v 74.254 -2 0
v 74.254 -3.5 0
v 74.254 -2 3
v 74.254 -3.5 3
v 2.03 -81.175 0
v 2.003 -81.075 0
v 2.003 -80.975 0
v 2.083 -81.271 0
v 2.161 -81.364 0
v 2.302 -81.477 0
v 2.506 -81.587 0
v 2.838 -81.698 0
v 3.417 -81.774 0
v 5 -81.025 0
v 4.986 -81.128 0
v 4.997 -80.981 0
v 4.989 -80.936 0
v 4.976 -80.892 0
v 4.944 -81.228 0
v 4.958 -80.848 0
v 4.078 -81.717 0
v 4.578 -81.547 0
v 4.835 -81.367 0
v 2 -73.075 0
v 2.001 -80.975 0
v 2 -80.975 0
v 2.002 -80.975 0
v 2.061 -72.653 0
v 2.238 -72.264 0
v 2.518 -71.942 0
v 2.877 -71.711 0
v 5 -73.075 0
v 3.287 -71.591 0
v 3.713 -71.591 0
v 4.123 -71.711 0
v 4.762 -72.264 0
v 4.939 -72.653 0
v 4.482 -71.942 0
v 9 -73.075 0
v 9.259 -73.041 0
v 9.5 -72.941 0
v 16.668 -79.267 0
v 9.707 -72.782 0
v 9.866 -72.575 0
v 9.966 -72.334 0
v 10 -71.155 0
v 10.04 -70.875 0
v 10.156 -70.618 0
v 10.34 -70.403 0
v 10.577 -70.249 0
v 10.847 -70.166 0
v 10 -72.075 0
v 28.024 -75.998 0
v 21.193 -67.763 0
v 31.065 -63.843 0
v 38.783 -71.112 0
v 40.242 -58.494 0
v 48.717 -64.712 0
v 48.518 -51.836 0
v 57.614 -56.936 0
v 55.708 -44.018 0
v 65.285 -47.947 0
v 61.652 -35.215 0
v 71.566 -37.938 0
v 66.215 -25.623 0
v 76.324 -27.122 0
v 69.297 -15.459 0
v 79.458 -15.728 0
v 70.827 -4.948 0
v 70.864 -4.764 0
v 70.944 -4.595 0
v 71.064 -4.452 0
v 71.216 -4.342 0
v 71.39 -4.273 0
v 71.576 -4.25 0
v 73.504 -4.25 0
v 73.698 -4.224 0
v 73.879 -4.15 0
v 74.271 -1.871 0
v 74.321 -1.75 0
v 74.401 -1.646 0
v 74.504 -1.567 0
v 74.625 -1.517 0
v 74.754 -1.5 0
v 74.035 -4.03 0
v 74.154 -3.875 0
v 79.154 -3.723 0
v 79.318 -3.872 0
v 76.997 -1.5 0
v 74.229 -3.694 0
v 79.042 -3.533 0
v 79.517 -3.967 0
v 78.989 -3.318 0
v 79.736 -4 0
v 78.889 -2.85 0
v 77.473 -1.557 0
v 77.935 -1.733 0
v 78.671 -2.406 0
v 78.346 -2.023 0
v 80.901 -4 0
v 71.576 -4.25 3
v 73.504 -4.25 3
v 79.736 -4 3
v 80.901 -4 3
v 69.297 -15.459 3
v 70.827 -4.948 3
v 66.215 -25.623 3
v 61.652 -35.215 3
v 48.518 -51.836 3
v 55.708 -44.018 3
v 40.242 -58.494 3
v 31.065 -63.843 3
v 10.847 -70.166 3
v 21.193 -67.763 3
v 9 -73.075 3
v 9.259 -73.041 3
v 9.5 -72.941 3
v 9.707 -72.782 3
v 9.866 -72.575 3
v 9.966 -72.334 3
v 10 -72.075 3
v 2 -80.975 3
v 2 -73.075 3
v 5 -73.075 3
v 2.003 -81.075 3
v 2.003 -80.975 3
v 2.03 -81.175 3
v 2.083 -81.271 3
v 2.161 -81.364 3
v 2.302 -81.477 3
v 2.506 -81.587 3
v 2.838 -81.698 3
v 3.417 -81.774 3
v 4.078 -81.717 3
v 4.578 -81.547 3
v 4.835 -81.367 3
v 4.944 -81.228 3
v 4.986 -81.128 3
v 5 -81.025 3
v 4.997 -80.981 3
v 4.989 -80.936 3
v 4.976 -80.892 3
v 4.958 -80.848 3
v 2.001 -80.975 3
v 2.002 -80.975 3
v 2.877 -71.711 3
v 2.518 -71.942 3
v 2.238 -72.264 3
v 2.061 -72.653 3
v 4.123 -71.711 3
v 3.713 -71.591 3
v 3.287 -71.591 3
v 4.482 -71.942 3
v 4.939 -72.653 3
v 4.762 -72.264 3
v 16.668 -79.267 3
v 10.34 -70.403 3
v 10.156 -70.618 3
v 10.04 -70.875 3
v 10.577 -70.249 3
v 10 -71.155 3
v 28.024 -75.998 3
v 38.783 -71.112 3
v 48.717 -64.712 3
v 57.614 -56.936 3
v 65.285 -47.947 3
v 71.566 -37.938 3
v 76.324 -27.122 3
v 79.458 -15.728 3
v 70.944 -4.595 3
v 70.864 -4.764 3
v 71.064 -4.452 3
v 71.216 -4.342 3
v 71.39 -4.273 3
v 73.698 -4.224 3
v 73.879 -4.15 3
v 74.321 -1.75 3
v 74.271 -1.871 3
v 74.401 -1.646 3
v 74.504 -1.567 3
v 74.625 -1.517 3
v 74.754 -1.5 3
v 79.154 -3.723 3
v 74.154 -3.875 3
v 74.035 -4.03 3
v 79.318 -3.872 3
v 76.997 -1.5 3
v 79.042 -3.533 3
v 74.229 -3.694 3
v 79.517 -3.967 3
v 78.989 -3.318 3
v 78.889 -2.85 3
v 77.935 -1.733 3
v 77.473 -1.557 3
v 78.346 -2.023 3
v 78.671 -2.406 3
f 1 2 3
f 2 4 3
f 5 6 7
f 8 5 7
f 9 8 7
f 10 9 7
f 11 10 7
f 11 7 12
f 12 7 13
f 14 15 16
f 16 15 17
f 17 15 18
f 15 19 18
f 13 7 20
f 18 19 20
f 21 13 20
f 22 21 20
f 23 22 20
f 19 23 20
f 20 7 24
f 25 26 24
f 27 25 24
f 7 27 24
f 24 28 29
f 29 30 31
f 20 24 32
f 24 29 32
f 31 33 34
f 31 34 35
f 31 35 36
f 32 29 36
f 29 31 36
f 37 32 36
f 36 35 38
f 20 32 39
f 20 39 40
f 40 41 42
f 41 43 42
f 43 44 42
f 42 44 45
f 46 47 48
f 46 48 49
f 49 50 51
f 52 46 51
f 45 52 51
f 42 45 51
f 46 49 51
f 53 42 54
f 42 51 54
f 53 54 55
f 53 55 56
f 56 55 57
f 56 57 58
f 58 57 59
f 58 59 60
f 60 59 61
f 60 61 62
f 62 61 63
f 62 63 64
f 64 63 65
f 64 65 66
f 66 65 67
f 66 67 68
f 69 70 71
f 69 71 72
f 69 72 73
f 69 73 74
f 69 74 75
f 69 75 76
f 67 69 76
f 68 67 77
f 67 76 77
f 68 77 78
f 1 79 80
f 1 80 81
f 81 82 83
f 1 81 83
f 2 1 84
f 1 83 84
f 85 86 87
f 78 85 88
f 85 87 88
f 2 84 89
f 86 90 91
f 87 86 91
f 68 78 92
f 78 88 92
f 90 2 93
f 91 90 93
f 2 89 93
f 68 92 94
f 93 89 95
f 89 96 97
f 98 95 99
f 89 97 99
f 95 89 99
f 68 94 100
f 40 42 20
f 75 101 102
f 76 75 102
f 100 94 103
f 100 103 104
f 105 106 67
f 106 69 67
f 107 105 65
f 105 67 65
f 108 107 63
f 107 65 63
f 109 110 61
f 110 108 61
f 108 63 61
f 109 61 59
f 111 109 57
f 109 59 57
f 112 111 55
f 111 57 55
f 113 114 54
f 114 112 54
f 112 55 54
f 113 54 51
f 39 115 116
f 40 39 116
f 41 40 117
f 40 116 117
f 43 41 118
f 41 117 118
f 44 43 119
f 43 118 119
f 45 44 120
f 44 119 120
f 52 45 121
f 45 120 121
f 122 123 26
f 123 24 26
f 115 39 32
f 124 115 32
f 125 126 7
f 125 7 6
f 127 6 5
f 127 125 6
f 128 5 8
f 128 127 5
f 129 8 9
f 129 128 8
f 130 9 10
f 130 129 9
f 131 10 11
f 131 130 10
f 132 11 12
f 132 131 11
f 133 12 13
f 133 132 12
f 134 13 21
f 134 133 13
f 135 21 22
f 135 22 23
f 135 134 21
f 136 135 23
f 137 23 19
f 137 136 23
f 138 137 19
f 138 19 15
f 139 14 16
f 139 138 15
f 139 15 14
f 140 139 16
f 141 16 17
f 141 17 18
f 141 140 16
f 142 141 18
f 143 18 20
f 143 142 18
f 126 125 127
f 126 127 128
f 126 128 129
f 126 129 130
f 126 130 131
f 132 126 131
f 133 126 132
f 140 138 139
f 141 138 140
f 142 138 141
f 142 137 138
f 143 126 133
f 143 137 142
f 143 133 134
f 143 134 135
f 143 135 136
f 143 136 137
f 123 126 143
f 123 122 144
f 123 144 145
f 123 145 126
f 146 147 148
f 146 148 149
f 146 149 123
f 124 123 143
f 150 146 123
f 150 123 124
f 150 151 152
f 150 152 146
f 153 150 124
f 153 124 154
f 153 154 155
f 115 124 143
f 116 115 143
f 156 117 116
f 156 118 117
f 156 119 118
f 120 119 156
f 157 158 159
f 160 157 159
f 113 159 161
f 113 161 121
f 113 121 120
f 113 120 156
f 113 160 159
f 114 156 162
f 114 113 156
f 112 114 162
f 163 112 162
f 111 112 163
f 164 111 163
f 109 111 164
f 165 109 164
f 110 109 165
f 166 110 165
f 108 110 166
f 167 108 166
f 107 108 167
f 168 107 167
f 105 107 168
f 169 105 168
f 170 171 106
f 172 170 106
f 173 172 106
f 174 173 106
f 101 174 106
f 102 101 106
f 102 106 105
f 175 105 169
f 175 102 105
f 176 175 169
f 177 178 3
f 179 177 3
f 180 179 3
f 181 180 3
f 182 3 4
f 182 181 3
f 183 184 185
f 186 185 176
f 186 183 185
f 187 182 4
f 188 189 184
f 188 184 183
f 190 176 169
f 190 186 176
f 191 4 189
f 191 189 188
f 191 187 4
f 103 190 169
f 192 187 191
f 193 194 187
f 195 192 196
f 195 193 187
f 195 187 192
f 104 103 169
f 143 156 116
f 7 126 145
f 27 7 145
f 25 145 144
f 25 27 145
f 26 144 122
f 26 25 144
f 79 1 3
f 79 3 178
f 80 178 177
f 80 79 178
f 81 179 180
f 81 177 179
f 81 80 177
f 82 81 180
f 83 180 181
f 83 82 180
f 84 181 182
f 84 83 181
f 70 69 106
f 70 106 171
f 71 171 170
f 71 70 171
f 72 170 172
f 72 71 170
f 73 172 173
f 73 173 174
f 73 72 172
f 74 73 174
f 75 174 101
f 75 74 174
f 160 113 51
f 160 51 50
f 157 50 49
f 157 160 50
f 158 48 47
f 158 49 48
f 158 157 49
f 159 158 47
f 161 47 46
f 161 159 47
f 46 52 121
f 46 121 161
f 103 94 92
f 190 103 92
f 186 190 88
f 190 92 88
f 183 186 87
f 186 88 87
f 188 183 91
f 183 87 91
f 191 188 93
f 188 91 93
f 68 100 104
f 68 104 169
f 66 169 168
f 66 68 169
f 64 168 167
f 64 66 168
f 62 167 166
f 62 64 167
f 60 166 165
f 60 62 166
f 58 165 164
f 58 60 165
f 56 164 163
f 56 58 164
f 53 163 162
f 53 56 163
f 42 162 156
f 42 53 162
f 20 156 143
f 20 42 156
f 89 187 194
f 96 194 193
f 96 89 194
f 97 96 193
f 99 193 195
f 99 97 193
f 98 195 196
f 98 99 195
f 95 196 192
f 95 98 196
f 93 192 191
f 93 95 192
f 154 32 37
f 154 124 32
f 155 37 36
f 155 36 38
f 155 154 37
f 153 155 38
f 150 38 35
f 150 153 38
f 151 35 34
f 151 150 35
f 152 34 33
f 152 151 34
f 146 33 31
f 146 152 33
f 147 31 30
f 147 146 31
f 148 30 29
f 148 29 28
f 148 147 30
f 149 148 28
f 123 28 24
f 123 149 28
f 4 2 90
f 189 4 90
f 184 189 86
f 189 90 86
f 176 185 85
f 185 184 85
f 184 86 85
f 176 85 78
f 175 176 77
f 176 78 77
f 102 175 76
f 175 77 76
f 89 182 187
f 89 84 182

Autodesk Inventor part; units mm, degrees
ref_plane "YZ Plane" through (0, 0, 0) normal (1, 0, 0) x (0, 1, 0)
ref_plane "XZ Plane" through (0, 0, 0) normal (0, 1, 0) x (-1, 0, 0)
ref_plane "XY Plane" through (0, 0, 0) normal (0, 0, 1) x (1, 0, 0)
sketch "Sketch1" plane through (0, 0, 0) normal (0, 0, 1) x (1, 0, 0)
  arc A0 (2, -80.9753) -> (80.9861, -1.5) centre (0, 0) ccw
  arc A1 (10, -70.2922) -> (70.9842, -1.5) centre (0, 0) ccw
  line L0 (10, -73.0753) -> (10, -70.2922)
  line L1 (70.9842, -1.5) -> (80.9861, -1.5)
  line L2 (0, 0) -> (0, 0) construction
  line L3 (10, -73.0753) -> (2, -73.0753)
  line L4 (2, -73.0753) -> (2, -80.9753)
  point P0 (75.9851, -1.5)
  dimension "d0" = 162
  dimension "d1" = 142
  dimension "d12" = 8
  dimension "d13" = 2
  dimension "d14" = 7.9
  dimension "d23" = 1.5
extrude "Extrusion1" add sketch "Sketch1" along normal blind 3
sketch "Sketch3" plane through (0, 0, 3) normal (0, 0, 1) x (1, 0, 0)
  line L0 (10, -73.0753) -> (2, -73.0753) projected
  circle A0 centre (3.5, -73.0753) radius 1.5
  line L1 (2, -73.0753) -> (2, -80.9753) construction
  line L2 (2, -77.0253) -> (11.8753, -77.0253) construction
  ellipse E0 centre (3.5, -81.0253) end of major axis (5, -81.0253) minor radius 0.75
  point P0 (0, 0)
  point P1 (5, -73.0753)
  dimension "d15" = 3
  dimension "d16" = 1.5
  dimension "d20" = 0.75
  dimension "d21" = 1.5
  dimension "d22" = 4
extrude "Extrusion3" add sketch "Sketch3" against normal up to surface (3 mm away) contours L0 A0 | E0 picked at (3.784, -72.1991)
fillet "Fillet1" radius 1 2 edges at (10, -73.0753, 1.5) (10, -70.2922, 1.5)
sketch "Sketch4" plane through (0, 0, 3) normal (0, 0, 1) x (1, 0, 0)
  line L0 (80.9861, -1.5) -> (70.9842, -1.5) projected
  line L1 (80.9861, -1.5) -> (78.9861, -1.5)
  line L2 (78.9861, -4) -> (80.9012, -4)
  arc A0 (4.9576, -80.8481) -> (80.9861, -1.5) centre (0, 0) ccw projected
  arc A1 (80.9012, -4) -> (80.9861, -1.5) centre (0, 0) ccw
  line L3 (78.9861, -1.5) -> (78.9861, -4)
  line L4 (74.2542, -1.5) -> (70.9842, -1.5)
  arc A2 (10.8472, -70.1665) -> (70.9842, -1.5) centre (0, 0) ccw projected
  arc A3 (70.8727, -4.25) -> (70.9842, -1.5) centre (0, 0) ccw
  line L5 (70.8727, -4.25) -> (74.2542, -4.25)
  line L6 (74.2542, -4.25) -> (74.2542, -1.5)
  point P0 (10, -70.2922)
  dimension "d25" = 2.5
  dimension "d30" = 2
  dimension "d31" = 2.75
  dimension "d32" = 3.27
extrude "Extrusion4" cut sketch "Sketch4" against normal blind 10
fillet "Fillet3" radius 0.75 3 edges at (70.8727, -4.25, 1.5) (74.2542, -4.25, 1.5) (78.9861, -4, 1.5)
fillet "Fillet4" radius 2 1 edges at (78.9861, -1.5, 1.5)
fillet "Fillet5" radius 0.5 1 edges at (74.2542, -1.5, 1.5)
equation "\"d16\" = 0.5 * d15"
properties part number "shim_cartridge_V3"
